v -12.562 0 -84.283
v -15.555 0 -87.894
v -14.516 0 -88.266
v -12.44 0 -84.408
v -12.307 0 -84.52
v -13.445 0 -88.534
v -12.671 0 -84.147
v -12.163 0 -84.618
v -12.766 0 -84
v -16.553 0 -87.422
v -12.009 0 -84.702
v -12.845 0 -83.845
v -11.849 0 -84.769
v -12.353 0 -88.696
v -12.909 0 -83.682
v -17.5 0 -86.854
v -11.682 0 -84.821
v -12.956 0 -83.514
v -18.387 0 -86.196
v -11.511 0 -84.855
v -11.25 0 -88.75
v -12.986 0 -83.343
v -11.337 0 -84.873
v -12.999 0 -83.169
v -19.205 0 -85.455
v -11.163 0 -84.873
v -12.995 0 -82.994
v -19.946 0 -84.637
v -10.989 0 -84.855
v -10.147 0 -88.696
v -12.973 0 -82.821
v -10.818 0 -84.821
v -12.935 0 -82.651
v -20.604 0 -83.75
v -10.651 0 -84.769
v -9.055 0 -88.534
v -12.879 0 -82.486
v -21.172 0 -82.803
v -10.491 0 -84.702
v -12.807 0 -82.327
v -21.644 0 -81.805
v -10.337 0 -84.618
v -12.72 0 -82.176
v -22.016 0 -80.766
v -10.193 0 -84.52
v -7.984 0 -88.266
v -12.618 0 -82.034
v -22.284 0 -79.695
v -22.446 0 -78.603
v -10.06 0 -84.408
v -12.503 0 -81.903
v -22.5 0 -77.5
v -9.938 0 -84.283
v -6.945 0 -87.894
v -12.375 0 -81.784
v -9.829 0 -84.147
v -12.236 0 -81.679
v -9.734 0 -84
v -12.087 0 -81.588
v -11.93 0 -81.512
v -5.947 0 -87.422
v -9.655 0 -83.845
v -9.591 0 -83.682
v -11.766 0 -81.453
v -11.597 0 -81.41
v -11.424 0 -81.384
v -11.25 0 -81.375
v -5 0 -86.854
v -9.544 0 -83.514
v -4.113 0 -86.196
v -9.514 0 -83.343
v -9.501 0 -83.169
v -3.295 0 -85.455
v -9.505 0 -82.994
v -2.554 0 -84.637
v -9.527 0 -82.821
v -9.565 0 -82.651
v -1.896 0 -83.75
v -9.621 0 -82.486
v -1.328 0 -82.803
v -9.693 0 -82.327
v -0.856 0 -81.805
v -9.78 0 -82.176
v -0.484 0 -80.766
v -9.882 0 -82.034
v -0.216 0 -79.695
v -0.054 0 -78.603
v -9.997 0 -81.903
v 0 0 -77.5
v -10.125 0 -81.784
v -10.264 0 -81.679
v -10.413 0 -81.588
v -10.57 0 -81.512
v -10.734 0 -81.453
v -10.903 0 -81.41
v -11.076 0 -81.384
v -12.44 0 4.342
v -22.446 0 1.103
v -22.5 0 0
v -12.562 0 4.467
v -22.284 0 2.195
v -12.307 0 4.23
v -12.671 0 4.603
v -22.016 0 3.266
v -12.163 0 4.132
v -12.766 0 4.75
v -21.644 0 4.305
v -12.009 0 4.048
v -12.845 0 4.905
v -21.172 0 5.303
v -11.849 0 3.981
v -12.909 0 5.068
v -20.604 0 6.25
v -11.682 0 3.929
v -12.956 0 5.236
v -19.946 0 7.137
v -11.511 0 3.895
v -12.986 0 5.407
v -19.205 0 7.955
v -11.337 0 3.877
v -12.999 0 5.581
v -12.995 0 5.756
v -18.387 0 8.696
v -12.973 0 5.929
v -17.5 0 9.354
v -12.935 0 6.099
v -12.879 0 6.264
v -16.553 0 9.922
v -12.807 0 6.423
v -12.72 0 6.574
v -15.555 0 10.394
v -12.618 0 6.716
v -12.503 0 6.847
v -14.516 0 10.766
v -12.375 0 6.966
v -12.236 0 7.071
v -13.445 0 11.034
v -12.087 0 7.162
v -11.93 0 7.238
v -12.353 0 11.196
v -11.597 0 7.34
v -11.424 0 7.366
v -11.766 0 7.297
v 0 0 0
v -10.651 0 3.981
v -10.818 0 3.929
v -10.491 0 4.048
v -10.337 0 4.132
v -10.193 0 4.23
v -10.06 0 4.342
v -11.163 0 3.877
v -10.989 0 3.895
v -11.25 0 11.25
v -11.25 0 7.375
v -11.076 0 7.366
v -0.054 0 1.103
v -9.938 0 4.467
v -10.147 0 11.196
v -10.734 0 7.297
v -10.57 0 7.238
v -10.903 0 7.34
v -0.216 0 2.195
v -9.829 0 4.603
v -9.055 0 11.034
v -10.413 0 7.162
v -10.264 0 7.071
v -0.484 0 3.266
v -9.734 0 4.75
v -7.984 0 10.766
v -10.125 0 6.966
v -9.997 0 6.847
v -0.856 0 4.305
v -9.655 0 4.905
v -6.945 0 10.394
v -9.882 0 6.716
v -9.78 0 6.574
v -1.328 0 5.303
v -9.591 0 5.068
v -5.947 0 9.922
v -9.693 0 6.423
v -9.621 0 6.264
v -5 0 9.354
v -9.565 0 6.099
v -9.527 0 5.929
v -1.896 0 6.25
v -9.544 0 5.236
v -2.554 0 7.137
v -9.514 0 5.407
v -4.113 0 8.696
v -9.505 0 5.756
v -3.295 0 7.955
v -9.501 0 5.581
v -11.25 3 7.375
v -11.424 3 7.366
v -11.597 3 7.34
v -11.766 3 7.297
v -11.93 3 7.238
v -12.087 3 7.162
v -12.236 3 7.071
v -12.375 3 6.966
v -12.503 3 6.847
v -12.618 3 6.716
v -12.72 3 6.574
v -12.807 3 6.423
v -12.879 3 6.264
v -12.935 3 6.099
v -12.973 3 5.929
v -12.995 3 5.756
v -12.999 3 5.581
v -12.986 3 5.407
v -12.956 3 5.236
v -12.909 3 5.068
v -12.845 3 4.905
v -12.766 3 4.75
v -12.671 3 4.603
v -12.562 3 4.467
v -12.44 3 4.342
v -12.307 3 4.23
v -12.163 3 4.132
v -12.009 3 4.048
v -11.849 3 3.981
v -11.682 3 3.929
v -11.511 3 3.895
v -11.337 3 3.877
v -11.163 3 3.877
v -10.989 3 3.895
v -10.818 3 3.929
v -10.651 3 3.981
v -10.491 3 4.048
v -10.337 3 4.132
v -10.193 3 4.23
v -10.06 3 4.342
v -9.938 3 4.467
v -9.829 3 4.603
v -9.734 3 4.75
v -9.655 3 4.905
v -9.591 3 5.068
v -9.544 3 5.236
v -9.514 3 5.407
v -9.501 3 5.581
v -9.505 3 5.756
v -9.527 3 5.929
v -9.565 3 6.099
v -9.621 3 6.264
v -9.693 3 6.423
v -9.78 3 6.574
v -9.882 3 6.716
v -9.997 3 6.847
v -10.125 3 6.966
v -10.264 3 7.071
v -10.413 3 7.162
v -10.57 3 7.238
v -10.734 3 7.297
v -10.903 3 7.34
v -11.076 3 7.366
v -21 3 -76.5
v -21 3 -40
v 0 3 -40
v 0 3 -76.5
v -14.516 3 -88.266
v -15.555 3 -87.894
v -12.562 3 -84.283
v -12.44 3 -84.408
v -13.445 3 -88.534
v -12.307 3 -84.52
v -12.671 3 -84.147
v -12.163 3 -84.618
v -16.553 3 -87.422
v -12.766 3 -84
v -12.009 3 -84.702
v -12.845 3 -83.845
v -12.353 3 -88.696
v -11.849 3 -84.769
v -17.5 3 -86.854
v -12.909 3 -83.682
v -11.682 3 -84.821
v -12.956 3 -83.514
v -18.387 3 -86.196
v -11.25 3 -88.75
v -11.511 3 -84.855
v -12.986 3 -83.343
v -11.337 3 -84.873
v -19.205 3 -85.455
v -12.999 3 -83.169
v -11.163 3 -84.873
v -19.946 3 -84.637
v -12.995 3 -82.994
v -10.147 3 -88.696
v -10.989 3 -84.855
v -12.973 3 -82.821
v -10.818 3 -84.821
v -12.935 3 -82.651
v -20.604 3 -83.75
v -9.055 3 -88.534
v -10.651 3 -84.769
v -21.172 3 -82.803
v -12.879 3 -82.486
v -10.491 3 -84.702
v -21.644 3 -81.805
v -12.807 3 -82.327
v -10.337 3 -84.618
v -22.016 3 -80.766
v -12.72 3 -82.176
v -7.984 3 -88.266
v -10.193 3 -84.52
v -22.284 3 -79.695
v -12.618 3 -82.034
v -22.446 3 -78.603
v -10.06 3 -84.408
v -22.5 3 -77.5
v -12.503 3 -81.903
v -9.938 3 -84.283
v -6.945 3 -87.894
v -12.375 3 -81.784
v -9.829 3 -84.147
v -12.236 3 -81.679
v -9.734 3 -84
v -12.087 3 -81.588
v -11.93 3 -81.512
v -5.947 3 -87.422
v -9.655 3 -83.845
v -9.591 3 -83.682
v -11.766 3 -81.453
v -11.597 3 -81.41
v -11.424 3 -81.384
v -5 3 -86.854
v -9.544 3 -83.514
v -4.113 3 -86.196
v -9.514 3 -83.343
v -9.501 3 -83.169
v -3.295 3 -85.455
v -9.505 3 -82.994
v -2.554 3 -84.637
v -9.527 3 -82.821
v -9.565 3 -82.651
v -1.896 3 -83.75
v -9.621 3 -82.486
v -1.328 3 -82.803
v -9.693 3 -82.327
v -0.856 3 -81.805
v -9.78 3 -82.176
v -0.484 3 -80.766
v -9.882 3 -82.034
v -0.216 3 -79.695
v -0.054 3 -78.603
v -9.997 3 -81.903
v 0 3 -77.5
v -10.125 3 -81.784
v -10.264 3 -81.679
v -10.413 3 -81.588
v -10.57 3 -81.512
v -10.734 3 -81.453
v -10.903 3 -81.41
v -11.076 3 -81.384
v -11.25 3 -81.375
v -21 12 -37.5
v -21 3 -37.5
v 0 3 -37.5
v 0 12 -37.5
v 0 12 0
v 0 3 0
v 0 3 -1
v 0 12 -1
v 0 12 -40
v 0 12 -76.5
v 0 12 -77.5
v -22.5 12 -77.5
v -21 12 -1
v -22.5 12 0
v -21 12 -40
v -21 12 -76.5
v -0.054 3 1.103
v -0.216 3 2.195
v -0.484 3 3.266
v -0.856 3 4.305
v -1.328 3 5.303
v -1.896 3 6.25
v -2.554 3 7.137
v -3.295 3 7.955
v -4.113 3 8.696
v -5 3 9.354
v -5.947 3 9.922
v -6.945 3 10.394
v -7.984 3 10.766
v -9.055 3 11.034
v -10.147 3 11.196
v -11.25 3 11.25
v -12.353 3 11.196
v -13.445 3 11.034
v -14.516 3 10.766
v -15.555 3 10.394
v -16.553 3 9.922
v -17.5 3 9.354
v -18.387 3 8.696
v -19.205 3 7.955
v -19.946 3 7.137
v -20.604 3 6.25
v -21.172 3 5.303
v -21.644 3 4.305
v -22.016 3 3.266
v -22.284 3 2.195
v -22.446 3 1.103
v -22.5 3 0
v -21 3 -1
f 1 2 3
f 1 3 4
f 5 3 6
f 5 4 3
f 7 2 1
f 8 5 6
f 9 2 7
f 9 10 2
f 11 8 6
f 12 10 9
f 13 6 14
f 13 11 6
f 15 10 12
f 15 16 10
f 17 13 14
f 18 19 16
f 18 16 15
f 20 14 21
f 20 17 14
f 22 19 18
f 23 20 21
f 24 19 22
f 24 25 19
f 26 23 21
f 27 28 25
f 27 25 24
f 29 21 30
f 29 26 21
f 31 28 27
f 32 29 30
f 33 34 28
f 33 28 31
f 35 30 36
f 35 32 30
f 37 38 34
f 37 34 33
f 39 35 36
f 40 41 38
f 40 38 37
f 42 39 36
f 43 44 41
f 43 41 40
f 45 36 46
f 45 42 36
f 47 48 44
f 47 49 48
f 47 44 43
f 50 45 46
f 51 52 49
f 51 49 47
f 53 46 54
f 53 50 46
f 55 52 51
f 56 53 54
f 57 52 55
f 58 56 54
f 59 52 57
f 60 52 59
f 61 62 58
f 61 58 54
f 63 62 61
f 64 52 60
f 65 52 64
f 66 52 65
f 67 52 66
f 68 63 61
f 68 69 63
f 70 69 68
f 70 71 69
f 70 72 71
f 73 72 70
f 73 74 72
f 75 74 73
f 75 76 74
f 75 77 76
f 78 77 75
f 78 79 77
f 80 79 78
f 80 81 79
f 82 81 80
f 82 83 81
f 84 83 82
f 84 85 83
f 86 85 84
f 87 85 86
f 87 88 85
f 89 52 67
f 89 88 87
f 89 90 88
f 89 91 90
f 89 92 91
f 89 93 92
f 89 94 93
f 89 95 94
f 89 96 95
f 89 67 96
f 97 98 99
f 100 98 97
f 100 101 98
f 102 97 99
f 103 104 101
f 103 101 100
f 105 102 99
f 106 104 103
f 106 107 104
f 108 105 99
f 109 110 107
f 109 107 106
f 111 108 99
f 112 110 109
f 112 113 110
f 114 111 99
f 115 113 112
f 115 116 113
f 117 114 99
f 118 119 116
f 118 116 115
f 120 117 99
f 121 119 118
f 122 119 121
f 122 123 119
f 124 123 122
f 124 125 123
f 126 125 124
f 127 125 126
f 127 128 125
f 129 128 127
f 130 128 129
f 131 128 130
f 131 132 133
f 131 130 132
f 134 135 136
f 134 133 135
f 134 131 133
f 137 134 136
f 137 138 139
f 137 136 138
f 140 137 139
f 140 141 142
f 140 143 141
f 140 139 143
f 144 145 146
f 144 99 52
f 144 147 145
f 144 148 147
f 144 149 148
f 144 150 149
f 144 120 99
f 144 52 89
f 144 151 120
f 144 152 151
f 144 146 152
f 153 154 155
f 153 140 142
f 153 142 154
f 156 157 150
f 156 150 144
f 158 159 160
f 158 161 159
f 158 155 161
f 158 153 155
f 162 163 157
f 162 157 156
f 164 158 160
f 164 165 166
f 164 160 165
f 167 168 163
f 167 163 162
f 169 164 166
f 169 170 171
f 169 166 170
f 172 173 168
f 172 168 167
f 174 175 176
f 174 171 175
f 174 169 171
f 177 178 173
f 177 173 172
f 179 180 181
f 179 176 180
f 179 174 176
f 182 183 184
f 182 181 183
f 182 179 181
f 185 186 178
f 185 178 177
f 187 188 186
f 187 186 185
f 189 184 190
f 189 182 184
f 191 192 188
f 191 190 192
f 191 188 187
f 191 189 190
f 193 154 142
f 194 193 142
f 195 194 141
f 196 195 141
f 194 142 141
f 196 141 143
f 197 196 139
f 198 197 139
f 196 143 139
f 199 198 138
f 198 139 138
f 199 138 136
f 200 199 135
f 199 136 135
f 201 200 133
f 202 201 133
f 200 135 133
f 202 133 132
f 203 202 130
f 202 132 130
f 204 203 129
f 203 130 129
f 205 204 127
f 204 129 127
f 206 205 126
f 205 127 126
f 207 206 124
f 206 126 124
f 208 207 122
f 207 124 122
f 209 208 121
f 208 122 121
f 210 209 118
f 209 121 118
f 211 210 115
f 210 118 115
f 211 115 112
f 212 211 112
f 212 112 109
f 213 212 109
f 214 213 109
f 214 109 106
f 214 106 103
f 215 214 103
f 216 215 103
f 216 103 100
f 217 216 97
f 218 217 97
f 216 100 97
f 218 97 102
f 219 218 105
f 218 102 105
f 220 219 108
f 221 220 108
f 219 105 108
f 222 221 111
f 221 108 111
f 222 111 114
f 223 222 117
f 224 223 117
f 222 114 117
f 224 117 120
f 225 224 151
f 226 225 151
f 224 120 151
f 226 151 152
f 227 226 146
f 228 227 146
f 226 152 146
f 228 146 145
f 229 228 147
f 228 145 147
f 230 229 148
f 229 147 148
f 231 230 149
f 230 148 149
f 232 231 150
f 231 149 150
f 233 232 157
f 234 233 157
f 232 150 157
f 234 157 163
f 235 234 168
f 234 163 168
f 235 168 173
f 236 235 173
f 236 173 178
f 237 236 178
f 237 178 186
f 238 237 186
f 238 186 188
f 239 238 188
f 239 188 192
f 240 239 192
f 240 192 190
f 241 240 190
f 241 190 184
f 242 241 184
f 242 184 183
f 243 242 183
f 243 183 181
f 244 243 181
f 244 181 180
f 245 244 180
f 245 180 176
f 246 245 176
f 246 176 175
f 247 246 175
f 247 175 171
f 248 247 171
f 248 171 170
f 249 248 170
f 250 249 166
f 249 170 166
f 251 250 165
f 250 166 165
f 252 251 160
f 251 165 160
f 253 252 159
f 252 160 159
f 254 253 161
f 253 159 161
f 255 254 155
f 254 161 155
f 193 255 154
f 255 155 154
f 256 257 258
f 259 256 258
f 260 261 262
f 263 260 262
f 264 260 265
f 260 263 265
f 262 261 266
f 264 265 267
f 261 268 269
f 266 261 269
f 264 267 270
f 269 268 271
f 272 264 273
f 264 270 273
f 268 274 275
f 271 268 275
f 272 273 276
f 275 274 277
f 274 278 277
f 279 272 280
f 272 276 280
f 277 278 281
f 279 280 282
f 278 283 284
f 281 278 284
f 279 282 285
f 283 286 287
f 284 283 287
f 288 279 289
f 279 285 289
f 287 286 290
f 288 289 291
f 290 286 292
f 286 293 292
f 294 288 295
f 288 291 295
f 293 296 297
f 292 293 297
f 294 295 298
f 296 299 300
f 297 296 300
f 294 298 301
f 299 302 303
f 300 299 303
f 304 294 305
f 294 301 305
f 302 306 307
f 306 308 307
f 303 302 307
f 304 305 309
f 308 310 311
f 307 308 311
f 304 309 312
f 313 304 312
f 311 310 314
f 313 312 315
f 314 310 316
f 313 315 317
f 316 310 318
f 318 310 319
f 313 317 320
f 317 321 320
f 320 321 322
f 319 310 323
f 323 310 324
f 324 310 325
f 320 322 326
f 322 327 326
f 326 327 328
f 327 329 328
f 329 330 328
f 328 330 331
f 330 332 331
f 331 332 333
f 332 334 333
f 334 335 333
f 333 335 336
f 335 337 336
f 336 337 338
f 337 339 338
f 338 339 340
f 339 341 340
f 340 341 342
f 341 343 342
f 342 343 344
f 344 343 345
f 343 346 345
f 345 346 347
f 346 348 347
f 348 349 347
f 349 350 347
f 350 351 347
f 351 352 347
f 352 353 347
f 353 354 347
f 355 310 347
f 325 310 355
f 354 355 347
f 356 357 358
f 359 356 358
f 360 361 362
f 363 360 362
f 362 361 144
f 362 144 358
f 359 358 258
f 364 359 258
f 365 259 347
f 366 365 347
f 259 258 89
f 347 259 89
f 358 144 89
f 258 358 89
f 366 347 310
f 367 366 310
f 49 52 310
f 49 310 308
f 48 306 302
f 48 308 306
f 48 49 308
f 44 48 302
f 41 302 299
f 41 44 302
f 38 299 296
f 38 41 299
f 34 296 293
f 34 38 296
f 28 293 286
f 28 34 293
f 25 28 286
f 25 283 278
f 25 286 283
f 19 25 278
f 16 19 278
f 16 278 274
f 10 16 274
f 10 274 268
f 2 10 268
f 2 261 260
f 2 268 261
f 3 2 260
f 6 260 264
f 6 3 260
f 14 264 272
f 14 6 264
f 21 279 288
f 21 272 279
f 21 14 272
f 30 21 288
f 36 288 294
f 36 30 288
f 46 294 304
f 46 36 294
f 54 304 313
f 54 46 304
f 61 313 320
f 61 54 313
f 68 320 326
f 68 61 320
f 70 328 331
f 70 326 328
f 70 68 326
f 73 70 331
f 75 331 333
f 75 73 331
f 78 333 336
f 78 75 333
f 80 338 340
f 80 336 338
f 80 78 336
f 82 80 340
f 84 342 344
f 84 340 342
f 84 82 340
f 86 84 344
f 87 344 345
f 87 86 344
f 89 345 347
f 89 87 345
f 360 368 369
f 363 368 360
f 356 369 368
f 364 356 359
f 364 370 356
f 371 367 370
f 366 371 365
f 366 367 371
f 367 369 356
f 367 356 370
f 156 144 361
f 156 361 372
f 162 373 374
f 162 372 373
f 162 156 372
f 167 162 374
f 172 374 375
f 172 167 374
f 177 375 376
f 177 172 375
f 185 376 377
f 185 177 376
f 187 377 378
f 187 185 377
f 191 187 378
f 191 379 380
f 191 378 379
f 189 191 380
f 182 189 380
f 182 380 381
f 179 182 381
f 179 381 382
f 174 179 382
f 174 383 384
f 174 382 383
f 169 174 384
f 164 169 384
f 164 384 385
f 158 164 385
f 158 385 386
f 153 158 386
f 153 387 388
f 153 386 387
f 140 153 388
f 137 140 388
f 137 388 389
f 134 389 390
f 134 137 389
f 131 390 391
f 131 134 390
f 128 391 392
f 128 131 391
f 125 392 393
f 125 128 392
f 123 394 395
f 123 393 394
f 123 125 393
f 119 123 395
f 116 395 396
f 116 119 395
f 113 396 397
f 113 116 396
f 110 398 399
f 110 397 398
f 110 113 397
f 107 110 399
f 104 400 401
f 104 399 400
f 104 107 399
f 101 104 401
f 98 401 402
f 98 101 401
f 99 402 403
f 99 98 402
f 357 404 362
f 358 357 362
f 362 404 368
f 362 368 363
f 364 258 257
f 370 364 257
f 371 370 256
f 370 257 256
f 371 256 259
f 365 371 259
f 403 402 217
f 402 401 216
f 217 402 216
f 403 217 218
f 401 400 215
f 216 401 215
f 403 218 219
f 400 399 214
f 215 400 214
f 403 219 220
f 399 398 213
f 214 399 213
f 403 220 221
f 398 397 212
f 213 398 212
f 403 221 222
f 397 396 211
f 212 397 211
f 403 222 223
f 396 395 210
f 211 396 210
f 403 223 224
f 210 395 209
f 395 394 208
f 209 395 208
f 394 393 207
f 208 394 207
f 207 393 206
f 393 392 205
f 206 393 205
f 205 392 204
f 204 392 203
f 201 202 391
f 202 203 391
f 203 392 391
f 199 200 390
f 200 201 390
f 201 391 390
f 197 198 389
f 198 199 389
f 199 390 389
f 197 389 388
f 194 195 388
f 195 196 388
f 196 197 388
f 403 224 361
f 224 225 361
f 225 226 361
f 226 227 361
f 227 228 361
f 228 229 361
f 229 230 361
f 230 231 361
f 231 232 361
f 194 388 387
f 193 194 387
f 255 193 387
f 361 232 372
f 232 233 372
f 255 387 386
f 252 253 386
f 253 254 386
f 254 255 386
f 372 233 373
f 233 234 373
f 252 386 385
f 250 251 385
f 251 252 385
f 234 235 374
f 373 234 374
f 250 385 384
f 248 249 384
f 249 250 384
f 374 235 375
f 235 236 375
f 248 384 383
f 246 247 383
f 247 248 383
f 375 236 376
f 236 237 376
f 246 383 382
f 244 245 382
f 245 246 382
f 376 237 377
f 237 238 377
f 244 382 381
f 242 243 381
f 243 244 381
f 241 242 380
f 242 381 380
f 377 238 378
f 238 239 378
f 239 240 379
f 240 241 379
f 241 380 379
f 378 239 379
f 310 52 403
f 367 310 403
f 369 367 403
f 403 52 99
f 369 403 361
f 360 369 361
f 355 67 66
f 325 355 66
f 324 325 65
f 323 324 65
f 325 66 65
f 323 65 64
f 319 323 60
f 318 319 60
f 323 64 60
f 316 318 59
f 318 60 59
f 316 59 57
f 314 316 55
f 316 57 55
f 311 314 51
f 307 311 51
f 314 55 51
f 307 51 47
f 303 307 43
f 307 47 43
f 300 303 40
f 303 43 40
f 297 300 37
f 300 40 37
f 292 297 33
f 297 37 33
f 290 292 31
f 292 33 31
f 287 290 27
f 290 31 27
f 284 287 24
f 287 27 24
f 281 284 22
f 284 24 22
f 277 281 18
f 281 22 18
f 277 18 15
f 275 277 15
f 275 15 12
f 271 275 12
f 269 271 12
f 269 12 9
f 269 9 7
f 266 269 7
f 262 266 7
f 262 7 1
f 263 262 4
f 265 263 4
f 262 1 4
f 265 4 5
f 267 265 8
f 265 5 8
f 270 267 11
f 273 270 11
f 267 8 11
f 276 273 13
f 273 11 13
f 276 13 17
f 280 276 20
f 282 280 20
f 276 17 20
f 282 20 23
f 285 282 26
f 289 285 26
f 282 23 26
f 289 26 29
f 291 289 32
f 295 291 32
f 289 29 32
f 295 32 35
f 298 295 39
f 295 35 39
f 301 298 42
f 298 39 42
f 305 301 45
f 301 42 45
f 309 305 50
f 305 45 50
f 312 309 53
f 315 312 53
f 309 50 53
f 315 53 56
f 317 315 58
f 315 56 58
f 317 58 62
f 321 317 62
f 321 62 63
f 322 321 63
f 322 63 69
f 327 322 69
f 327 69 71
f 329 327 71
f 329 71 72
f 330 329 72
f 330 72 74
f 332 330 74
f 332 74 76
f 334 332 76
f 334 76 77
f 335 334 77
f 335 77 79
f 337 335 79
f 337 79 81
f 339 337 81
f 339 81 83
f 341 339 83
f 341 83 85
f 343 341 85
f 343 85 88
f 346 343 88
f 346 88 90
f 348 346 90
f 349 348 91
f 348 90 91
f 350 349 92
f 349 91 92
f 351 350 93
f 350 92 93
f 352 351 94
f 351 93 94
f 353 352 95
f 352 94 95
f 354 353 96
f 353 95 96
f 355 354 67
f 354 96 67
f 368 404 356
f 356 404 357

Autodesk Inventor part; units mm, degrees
ref_plane "YZ Plane" through (0, 0, 0) normal (1, 0, 0) x (0, 1, 0)
ref_plane "XZ Plane" through (0, 0, 0) normal (0, 1, 0) x (-1, 0, 0)
ref_plane "XY Plane" through (0, 0, 0) normal (0, 0, 1) x (1, 0, 0)
sketch "Sketch4" plane through (0, 0, 0) normal (0, 1, 0) x (-1, 0, 0)
  line L0 (0, 0) -> (22.5, 0)
  line L1 (22.5, 0) -> (22.5, -77.5)
  line L2 (22.5, -77.5) -> (0, -77.5)
  line L3 (0, -77.5) -> (0, 0)
  arc A0 (0, -77.5) -> (22.5, -77.5) centre (11.25, -77.5) ccw
  arc A1 (22.5, 0) -> (0, 0) centre (11.25, 0) ccw
  dimension "d13" = 22.5
  dimension "d14" = 77.5
extrude "Extrusion10" add sketch "Sketch4" along normal blind 3 contours A1 L0 | L2 A0
sketch "Sketch13" plane through (0, 0, 0) normal (0, -1, 0) x (1, 0, 0)
  line L0 (0, 0) -> (-22.5, 0) projected
  line L1 (-22.5, -77.5) -> (0, -77.5) projected
  line L2 (0, 0) -> (-22.5, 0)
  line L3 (-22.5, 0) -> (-22.5, -77.5)
  line L4 (-22.5, -77.5) -> (0, -77.5)
  line L5 (0, -77.5) -> (0, 0)
extrude "Extrusion11" add sketch "Sketch13" against normal blind 3
sketch "Sketch17" plane through (0, 3, 0) normal (0, 1, 0) x (1, 0, 0)
  line L0 (-22.5, 77.5) -> (-22.5, 0) projected
  line L1 (-22.5, 0) -> (-21, 0)
  line L2 (-21, 0) -> (-21, 77.5)
  line L3 (-21, 77.5) -> (-22.5, 77.5)
  line L4 (-22.5, 77.5) -> (-22.5, 0)
  point P0 (0, 0)
  dimension "d82" = 1.5
extrude "Extrusion14" add sketch "Sketch17" along normal blind 9
sketch "Sketch18" plane through (0, 3, 0) normal (0, 1, 0) x (1, 0, 0)
  line L0 (0, 0) -> (0, 77.5) projected
  line L1 (-21, 0) -> (-21, 77.5) projected
  line L2 (0, 0) -> (-21, 0)
  line L3 (-21, 0) -> (-21, 1)
  line L4 (-21, 1) -> (0, 1)
  line L5 (0, 1) -> (0, 0)
  arc A0 (0, 77.5) -> (-22.5, 77.5) centre (-11.25, 77.5) ccw projected
  line L6 (0, 77.5) -> (-21, 77.5)
  line L7 (-21, 77.5) -> (-21, 76.5)
  line L8 (-21, 76.5) -> (0, 76.5)
  line L9 (0, 76.5) -> (0, 77.5)
  line L10 (-21, 37.5) -> (0, 37.5)
  line L11 (0, 37.5) -> (0, 40)
  line L12 (0, 40) -> (-21, 40)
  line L13 (-21, 40) -> (-21, 37.5)
  dimension "d85" = 1
  dimension "d86" = 1
  dimension "d87" = 2.5
  dimension "d88" = 36.5
extrude "Extrusion15" add sketch "Sketch18" along normal blind 9 contours L2 L1 L4 L0 | L10 L1 L12 L0 | L8 L1 L6 L0
sketch "Sketch19" plane through (0, 3, 0) normal (0, 1, 0) x (1, 0, 0)
  line L0 (0, 77.5) -> (-22.5, 77.5) projected
  circle A0 centre (-11.25, 83.125) radius 1.75
  arc A1 (-22.5, 0) -> (0, 0) centre (-11.25, 0) ccw projected
  circle A2 centre (-11.25, -5.625) radius 1.75
  dimension "d92" = 3.5
  dimension "d94" = 3.5
hole "Hole3" at (-11.25, 3, -83.125) at (-11.25, 3, 5.625) direction (0, -1, 0) diameter 3.5 end through all
properties part number "Wago Terminal Block New"
